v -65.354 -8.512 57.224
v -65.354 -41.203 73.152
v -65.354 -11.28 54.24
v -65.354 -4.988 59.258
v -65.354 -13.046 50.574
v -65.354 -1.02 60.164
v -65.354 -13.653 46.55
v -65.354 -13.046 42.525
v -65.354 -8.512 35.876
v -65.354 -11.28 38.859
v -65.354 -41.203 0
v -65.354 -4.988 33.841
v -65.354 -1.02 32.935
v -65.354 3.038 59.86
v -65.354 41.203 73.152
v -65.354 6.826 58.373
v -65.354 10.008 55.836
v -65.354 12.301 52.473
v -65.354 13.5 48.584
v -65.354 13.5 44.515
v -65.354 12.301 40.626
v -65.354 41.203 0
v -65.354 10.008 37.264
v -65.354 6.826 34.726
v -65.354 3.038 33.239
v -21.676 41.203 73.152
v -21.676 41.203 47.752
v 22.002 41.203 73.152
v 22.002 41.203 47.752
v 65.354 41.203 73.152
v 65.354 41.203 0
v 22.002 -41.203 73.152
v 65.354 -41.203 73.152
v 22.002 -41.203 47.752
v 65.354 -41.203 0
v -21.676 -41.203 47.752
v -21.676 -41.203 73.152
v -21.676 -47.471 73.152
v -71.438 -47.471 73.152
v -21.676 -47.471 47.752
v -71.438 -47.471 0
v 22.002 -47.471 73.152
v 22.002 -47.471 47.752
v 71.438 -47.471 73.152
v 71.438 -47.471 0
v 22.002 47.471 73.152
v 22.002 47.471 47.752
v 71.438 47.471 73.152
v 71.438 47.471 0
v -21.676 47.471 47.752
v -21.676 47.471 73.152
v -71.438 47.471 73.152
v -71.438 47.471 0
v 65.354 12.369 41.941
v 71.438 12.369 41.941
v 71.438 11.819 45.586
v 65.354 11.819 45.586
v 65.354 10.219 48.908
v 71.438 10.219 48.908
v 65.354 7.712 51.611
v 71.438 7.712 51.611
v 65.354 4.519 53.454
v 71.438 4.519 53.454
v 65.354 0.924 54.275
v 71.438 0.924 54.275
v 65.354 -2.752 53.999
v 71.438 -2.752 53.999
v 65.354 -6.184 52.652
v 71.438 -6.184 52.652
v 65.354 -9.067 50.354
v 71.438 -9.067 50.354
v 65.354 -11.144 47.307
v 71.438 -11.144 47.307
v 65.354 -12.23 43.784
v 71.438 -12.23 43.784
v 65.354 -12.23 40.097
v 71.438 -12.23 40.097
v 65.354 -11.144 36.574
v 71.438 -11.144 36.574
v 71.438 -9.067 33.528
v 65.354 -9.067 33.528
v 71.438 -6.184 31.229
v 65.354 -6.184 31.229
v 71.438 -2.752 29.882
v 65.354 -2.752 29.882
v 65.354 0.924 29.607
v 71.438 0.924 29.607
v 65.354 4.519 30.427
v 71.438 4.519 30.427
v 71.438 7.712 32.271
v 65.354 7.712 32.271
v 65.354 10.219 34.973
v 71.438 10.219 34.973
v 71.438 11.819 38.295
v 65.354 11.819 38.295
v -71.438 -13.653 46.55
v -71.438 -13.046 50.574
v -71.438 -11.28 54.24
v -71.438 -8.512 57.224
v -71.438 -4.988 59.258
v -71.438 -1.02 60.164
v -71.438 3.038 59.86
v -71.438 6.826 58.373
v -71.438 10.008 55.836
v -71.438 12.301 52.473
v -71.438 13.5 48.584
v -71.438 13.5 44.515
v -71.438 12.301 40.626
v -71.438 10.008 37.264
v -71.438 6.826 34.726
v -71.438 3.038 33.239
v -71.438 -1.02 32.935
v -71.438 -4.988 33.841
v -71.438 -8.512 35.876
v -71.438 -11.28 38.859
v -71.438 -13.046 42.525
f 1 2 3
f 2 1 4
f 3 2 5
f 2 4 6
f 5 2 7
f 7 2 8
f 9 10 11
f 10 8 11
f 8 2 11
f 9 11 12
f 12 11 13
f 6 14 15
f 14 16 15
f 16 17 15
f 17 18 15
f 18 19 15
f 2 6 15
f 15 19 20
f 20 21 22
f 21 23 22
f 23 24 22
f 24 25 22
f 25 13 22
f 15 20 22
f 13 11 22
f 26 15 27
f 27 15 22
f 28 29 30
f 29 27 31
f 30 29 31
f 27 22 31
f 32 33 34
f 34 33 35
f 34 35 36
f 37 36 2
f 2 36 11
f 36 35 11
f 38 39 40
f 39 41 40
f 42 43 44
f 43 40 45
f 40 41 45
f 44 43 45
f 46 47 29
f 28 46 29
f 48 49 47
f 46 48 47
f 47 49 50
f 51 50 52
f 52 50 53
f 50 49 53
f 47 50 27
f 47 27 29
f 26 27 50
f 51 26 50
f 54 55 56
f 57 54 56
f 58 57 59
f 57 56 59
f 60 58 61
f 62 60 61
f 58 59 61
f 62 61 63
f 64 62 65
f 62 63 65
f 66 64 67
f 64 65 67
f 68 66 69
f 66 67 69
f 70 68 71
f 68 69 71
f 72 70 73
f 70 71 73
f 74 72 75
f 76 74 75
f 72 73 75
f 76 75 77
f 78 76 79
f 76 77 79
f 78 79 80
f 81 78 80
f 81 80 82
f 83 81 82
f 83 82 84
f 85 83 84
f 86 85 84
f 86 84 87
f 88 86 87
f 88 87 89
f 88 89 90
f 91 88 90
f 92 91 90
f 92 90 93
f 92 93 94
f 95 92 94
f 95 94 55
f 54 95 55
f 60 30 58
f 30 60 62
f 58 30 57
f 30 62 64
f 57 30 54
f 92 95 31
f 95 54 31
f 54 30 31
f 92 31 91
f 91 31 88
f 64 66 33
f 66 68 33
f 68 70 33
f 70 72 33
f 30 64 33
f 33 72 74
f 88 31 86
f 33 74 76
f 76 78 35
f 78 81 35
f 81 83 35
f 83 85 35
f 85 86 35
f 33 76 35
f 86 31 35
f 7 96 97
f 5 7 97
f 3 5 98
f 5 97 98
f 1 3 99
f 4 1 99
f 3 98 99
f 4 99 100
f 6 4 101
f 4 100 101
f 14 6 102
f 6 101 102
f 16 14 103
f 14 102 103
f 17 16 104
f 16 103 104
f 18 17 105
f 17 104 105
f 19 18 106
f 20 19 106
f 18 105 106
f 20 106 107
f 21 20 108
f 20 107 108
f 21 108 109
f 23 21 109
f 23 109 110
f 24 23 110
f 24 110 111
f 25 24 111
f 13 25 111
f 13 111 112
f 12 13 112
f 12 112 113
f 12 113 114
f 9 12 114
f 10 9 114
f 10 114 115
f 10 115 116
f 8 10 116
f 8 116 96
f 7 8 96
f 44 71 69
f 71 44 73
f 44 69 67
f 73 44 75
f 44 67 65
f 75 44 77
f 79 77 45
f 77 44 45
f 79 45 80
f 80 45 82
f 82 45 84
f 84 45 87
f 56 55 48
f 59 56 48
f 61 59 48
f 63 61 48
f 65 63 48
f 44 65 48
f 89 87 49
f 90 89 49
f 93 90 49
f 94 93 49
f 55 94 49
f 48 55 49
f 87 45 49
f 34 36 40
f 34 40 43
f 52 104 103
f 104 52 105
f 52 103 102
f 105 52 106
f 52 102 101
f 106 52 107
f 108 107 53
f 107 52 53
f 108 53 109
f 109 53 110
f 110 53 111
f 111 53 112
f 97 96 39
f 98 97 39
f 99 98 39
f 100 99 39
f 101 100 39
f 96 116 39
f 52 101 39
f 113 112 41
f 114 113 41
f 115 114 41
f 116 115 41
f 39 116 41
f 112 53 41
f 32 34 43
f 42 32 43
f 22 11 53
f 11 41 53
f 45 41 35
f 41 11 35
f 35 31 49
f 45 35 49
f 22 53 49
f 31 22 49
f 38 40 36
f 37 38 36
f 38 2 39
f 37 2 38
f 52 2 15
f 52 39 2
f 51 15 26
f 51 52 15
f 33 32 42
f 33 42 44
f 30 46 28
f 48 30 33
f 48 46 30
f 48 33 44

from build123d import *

# Parameters (mm, degrees)
F0_W      = 142.8750008345
F0_H      = 94.9427485466
F0_W_2    = 130.7075917721
F0_H_2    = 82.4066177011
F1_DEPTH  = 47.752
F3_DEPTH  = 25.4
F5_DEPTH  = 25.4
F7_R      = 12.3686155683
F8_DEPTH  = 25.4
F9_R      = 13.6525334008
F10_DEPTH = 25.4


with BuildPart() as f1:
    # F0 (on Top) → F1 (new body)
    with BuildSketch(Plane.XY):
        Rectangle(F0_W, F0_H)
        Rectangle(F0_W_2, F0_H_2, mode=Mode.SUBTRACT)
    extrude(amount=F1_DEPTH)

    # F2 (on face) → F3 (join)
    with BuildSketch(Plane.XY.offset(47.752)):
        Polygon((71.4375004172, -47.4713742733), (71.4375004172, 47.4713742733), (22.0016445965, 47.4713742733), (22.0016445965, 41.2033088505), (65.353795886, 41.2033088505), (65.353795886, -41.2033088505), (22.0016445965, -41.2033088505), (22.0016445965, -47.4713742733), align=None)
    extrude(amount=F3_DEPTH)

    # F4 (on face) → F5 (join)
    with BuildSketch(Plane.XY.offset(47.752)):
        Polygon((-21.6760756448, 47.4713742733), (-71.4375004172, 47.4713742733), (-71.4375004172, -47.4713742733), (-21.6760756448, -47.4713742733), (-21.6760756448, -41.2033088505), (-65.353795886, -41.2033088505), (-65.353795886, 41.2033088505), (-21.6760756448, 41.2033088505), align=None)
    extrude(amount=F5_DEPTH)

    # F7 (on face) → F8 (cut)
    with BuildSketch(Plane.YZ.offset(71.4375004172)):
        with Locations((0, 41.9407263398)):
            Circle(F7_R)
    extrude(amount=-F8_DEPTH, mode=Mode.SUBTRACT)

    # F9 (on face) → F10 (cut)
    with BuildSketch(Plane(origin=(-71.4375004172, 0, 0), x_dir=(0, -1, 0), z_dir=(-1, 0, 0))):
        with Locations((0, 46.5495996177)):
            Circle(F9_R)
    extrude(amount=-F10_DEPTH, mode=Mode.SUBTRACT)


solid = f1.part
